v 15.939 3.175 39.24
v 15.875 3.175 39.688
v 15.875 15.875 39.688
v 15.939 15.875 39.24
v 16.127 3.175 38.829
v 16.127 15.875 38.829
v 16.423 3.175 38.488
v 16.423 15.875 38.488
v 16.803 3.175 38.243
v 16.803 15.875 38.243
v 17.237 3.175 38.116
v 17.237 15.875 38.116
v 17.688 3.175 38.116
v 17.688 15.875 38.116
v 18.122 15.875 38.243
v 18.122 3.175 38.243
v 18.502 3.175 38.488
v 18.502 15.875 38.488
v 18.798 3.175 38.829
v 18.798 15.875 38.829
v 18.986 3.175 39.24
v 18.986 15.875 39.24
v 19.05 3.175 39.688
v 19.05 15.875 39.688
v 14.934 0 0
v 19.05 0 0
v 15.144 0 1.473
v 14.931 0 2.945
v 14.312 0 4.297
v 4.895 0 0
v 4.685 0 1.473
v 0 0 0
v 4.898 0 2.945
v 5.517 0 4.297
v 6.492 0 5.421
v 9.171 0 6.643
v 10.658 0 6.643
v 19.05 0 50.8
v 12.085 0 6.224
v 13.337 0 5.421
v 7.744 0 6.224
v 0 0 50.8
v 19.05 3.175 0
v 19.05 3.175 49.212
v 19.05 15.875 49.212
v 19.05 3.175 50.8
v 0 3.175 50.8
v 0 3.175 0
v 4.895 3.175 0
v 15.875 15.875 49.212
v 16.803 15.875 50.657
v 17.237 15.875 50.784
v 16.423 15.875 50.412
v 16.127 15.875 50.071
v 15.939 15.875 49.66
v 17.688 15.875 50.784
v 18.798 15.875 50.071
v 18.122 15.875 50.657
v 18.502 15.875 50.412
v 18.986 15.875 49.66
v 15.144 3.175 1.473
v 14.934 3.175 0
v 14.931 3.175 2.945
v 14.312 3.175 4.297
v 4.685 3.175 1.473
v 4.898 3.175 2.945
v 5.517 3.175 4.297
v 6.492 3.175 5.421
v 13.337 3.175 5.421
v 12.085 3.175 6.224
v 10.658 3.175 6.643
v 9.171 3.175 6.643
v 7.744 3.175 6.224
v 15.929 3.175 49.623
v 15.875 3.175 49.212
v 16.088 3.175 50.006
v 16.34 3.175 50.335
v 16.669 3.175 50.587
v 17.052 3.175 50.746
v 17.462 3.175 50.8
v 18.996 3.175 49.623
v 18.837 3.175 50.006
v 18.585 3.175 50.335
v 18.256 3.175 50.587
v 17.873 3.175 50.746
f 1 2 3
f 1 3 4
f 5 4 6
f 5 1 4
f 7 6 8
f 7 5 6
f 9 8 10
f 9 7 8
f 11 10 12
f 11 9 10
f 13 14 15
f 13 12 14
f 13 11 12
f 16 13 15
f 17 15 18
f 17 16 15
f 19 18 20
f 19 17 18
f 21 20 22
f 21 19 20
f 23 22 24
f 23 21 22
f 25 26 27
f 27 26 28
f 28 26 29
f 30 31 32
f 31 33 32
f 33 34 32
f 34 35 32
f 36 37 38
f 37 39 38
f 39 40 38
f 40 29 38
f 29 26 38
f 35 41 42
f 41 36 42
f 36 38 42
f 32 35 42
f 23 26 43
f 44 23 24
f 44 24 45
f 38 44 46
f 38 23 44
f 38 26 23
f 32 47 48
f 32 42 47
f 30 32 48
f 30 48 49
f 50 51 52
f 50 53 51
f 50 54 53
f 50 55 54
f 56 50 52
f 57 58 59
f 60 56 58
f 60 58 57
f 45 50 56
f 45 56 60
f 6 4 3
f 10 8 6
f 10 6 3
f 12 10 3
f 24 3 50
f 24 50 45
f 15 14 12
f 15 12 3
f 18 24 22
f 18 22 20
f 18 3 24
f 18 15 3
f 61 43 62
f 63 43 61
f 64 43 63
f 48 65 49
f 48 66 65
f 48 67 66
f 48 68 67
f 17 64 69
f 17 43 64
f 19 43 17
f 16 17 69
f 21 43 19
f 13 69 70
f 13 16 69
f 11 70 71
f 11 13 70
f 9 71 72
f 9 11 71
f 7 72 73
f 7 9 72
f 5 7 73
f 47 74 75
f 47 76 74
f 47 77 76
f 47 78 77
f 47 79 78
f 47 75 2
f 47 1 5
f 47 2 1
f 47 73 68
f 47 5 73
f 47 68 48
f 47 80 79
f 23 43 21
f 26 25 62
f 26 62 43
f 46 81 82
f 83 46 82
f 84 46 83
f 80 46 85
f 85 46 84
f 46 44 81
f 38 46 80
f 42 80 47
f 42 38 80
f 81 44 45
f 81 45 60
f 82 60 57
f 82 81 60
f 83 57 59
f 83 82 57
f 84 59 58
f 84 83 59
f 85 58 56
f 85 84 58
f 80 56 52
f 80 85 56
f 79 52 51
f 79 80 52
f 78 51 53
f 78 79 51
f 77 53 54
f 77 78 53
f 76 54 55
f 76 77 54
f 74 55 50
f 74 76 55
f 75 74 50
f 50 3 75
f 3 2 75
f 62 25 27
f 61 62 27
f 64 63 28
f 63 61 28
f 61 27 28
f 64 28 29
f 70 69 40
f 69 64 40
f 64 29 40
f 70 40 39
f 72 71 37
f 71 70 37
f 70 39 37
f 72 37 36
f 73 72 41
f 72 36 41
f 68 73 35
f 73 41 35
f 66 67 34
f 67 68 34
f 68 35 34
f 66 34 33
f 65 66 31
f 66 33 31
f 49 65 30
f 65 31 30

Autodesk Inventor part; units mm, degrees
ref_plane "YZ Plane" through (0, 0, 0) normal (1, 0, 0) x (0, 1, 0)
ref_plane "XZ Plane" through (0, 0, 0) normal (0, 1, 0) x (-1, 0, 0)
ref_plane "XY Plane" through (0, 0, 0) normal (0, 0, 1) x (1, 0, 0)
sketch "Sketch1" plane through (0, 0, 0) normal (0, 1, 0) x (-1, 0, 0)
  line L0 (0, 0) -> (-19.05, 0)
  line L1 (-19.05, 0) -> (-19.05, 50.8)
  line L2 (-19.05, 50.8) -> (0, 50.8)
  line L3 (0, 50.8) -> (0, 0)
  circle A0 centre (-9.525, 3.175) radius 6.35
  point P0 (-1.5875, 0)
  point P1 (-11.1125, 0)
  dimension "d1" = 19.05
  dimension "d4" = 50.8
  dimension "d11" = 12.7
  dimension "d12" = 3.175
  dimension "d13" = 9.525
extrude "Extrusion1" add sketch "Sketch1" along normal blind 3.175 contours L0 A0 L1 L2 L3 | L0 A0 picked at (-8.7548, 5.6041)
sketch "Sketch2" plane through (0, 3.175, 0) normal (0, 1, 0) x (1, 0, 0)
  line L0 (17.4625, -49.2125) -> (17.4625, -39.6875) construction
  line L1 (19.05, -49.2125) -> (19.05, -39.6875)
  line L2 (15.875, -39.6875) -> (15.875, -49.2125)
  arc A0 (15.875, -49.2125) -> (19.05, -49.2125) centre (17.4625, -49.2125) ccw
  arc A1 (19.05, -39.6875) -> (15.875, -39.6875) centre (17.4625, -39.6875) ccw
  line L3 (0, -50.8) -> (19.05, -50.8) projected
  line L4 (19.05, -50.8) -> (19.05, 0) projected
  point P0 (0, 0)
  point P1 (17.4625, -44.45)
  dimension "d23" = 1.5875
  dimension "d24" = 1.5875
  dimension "d25" = 9.525
  dimension "d26" = 0
extrude "Extrusion2" add sketch "Sketch2" along normal blind 12.7 contours A0 L2 A1 L1
hole "Hole1" at (9.9145, 3.175, 1.4669) direction (0, -1, 0) diameter 10.4588 end through all
properties part number "piston locking tool"
